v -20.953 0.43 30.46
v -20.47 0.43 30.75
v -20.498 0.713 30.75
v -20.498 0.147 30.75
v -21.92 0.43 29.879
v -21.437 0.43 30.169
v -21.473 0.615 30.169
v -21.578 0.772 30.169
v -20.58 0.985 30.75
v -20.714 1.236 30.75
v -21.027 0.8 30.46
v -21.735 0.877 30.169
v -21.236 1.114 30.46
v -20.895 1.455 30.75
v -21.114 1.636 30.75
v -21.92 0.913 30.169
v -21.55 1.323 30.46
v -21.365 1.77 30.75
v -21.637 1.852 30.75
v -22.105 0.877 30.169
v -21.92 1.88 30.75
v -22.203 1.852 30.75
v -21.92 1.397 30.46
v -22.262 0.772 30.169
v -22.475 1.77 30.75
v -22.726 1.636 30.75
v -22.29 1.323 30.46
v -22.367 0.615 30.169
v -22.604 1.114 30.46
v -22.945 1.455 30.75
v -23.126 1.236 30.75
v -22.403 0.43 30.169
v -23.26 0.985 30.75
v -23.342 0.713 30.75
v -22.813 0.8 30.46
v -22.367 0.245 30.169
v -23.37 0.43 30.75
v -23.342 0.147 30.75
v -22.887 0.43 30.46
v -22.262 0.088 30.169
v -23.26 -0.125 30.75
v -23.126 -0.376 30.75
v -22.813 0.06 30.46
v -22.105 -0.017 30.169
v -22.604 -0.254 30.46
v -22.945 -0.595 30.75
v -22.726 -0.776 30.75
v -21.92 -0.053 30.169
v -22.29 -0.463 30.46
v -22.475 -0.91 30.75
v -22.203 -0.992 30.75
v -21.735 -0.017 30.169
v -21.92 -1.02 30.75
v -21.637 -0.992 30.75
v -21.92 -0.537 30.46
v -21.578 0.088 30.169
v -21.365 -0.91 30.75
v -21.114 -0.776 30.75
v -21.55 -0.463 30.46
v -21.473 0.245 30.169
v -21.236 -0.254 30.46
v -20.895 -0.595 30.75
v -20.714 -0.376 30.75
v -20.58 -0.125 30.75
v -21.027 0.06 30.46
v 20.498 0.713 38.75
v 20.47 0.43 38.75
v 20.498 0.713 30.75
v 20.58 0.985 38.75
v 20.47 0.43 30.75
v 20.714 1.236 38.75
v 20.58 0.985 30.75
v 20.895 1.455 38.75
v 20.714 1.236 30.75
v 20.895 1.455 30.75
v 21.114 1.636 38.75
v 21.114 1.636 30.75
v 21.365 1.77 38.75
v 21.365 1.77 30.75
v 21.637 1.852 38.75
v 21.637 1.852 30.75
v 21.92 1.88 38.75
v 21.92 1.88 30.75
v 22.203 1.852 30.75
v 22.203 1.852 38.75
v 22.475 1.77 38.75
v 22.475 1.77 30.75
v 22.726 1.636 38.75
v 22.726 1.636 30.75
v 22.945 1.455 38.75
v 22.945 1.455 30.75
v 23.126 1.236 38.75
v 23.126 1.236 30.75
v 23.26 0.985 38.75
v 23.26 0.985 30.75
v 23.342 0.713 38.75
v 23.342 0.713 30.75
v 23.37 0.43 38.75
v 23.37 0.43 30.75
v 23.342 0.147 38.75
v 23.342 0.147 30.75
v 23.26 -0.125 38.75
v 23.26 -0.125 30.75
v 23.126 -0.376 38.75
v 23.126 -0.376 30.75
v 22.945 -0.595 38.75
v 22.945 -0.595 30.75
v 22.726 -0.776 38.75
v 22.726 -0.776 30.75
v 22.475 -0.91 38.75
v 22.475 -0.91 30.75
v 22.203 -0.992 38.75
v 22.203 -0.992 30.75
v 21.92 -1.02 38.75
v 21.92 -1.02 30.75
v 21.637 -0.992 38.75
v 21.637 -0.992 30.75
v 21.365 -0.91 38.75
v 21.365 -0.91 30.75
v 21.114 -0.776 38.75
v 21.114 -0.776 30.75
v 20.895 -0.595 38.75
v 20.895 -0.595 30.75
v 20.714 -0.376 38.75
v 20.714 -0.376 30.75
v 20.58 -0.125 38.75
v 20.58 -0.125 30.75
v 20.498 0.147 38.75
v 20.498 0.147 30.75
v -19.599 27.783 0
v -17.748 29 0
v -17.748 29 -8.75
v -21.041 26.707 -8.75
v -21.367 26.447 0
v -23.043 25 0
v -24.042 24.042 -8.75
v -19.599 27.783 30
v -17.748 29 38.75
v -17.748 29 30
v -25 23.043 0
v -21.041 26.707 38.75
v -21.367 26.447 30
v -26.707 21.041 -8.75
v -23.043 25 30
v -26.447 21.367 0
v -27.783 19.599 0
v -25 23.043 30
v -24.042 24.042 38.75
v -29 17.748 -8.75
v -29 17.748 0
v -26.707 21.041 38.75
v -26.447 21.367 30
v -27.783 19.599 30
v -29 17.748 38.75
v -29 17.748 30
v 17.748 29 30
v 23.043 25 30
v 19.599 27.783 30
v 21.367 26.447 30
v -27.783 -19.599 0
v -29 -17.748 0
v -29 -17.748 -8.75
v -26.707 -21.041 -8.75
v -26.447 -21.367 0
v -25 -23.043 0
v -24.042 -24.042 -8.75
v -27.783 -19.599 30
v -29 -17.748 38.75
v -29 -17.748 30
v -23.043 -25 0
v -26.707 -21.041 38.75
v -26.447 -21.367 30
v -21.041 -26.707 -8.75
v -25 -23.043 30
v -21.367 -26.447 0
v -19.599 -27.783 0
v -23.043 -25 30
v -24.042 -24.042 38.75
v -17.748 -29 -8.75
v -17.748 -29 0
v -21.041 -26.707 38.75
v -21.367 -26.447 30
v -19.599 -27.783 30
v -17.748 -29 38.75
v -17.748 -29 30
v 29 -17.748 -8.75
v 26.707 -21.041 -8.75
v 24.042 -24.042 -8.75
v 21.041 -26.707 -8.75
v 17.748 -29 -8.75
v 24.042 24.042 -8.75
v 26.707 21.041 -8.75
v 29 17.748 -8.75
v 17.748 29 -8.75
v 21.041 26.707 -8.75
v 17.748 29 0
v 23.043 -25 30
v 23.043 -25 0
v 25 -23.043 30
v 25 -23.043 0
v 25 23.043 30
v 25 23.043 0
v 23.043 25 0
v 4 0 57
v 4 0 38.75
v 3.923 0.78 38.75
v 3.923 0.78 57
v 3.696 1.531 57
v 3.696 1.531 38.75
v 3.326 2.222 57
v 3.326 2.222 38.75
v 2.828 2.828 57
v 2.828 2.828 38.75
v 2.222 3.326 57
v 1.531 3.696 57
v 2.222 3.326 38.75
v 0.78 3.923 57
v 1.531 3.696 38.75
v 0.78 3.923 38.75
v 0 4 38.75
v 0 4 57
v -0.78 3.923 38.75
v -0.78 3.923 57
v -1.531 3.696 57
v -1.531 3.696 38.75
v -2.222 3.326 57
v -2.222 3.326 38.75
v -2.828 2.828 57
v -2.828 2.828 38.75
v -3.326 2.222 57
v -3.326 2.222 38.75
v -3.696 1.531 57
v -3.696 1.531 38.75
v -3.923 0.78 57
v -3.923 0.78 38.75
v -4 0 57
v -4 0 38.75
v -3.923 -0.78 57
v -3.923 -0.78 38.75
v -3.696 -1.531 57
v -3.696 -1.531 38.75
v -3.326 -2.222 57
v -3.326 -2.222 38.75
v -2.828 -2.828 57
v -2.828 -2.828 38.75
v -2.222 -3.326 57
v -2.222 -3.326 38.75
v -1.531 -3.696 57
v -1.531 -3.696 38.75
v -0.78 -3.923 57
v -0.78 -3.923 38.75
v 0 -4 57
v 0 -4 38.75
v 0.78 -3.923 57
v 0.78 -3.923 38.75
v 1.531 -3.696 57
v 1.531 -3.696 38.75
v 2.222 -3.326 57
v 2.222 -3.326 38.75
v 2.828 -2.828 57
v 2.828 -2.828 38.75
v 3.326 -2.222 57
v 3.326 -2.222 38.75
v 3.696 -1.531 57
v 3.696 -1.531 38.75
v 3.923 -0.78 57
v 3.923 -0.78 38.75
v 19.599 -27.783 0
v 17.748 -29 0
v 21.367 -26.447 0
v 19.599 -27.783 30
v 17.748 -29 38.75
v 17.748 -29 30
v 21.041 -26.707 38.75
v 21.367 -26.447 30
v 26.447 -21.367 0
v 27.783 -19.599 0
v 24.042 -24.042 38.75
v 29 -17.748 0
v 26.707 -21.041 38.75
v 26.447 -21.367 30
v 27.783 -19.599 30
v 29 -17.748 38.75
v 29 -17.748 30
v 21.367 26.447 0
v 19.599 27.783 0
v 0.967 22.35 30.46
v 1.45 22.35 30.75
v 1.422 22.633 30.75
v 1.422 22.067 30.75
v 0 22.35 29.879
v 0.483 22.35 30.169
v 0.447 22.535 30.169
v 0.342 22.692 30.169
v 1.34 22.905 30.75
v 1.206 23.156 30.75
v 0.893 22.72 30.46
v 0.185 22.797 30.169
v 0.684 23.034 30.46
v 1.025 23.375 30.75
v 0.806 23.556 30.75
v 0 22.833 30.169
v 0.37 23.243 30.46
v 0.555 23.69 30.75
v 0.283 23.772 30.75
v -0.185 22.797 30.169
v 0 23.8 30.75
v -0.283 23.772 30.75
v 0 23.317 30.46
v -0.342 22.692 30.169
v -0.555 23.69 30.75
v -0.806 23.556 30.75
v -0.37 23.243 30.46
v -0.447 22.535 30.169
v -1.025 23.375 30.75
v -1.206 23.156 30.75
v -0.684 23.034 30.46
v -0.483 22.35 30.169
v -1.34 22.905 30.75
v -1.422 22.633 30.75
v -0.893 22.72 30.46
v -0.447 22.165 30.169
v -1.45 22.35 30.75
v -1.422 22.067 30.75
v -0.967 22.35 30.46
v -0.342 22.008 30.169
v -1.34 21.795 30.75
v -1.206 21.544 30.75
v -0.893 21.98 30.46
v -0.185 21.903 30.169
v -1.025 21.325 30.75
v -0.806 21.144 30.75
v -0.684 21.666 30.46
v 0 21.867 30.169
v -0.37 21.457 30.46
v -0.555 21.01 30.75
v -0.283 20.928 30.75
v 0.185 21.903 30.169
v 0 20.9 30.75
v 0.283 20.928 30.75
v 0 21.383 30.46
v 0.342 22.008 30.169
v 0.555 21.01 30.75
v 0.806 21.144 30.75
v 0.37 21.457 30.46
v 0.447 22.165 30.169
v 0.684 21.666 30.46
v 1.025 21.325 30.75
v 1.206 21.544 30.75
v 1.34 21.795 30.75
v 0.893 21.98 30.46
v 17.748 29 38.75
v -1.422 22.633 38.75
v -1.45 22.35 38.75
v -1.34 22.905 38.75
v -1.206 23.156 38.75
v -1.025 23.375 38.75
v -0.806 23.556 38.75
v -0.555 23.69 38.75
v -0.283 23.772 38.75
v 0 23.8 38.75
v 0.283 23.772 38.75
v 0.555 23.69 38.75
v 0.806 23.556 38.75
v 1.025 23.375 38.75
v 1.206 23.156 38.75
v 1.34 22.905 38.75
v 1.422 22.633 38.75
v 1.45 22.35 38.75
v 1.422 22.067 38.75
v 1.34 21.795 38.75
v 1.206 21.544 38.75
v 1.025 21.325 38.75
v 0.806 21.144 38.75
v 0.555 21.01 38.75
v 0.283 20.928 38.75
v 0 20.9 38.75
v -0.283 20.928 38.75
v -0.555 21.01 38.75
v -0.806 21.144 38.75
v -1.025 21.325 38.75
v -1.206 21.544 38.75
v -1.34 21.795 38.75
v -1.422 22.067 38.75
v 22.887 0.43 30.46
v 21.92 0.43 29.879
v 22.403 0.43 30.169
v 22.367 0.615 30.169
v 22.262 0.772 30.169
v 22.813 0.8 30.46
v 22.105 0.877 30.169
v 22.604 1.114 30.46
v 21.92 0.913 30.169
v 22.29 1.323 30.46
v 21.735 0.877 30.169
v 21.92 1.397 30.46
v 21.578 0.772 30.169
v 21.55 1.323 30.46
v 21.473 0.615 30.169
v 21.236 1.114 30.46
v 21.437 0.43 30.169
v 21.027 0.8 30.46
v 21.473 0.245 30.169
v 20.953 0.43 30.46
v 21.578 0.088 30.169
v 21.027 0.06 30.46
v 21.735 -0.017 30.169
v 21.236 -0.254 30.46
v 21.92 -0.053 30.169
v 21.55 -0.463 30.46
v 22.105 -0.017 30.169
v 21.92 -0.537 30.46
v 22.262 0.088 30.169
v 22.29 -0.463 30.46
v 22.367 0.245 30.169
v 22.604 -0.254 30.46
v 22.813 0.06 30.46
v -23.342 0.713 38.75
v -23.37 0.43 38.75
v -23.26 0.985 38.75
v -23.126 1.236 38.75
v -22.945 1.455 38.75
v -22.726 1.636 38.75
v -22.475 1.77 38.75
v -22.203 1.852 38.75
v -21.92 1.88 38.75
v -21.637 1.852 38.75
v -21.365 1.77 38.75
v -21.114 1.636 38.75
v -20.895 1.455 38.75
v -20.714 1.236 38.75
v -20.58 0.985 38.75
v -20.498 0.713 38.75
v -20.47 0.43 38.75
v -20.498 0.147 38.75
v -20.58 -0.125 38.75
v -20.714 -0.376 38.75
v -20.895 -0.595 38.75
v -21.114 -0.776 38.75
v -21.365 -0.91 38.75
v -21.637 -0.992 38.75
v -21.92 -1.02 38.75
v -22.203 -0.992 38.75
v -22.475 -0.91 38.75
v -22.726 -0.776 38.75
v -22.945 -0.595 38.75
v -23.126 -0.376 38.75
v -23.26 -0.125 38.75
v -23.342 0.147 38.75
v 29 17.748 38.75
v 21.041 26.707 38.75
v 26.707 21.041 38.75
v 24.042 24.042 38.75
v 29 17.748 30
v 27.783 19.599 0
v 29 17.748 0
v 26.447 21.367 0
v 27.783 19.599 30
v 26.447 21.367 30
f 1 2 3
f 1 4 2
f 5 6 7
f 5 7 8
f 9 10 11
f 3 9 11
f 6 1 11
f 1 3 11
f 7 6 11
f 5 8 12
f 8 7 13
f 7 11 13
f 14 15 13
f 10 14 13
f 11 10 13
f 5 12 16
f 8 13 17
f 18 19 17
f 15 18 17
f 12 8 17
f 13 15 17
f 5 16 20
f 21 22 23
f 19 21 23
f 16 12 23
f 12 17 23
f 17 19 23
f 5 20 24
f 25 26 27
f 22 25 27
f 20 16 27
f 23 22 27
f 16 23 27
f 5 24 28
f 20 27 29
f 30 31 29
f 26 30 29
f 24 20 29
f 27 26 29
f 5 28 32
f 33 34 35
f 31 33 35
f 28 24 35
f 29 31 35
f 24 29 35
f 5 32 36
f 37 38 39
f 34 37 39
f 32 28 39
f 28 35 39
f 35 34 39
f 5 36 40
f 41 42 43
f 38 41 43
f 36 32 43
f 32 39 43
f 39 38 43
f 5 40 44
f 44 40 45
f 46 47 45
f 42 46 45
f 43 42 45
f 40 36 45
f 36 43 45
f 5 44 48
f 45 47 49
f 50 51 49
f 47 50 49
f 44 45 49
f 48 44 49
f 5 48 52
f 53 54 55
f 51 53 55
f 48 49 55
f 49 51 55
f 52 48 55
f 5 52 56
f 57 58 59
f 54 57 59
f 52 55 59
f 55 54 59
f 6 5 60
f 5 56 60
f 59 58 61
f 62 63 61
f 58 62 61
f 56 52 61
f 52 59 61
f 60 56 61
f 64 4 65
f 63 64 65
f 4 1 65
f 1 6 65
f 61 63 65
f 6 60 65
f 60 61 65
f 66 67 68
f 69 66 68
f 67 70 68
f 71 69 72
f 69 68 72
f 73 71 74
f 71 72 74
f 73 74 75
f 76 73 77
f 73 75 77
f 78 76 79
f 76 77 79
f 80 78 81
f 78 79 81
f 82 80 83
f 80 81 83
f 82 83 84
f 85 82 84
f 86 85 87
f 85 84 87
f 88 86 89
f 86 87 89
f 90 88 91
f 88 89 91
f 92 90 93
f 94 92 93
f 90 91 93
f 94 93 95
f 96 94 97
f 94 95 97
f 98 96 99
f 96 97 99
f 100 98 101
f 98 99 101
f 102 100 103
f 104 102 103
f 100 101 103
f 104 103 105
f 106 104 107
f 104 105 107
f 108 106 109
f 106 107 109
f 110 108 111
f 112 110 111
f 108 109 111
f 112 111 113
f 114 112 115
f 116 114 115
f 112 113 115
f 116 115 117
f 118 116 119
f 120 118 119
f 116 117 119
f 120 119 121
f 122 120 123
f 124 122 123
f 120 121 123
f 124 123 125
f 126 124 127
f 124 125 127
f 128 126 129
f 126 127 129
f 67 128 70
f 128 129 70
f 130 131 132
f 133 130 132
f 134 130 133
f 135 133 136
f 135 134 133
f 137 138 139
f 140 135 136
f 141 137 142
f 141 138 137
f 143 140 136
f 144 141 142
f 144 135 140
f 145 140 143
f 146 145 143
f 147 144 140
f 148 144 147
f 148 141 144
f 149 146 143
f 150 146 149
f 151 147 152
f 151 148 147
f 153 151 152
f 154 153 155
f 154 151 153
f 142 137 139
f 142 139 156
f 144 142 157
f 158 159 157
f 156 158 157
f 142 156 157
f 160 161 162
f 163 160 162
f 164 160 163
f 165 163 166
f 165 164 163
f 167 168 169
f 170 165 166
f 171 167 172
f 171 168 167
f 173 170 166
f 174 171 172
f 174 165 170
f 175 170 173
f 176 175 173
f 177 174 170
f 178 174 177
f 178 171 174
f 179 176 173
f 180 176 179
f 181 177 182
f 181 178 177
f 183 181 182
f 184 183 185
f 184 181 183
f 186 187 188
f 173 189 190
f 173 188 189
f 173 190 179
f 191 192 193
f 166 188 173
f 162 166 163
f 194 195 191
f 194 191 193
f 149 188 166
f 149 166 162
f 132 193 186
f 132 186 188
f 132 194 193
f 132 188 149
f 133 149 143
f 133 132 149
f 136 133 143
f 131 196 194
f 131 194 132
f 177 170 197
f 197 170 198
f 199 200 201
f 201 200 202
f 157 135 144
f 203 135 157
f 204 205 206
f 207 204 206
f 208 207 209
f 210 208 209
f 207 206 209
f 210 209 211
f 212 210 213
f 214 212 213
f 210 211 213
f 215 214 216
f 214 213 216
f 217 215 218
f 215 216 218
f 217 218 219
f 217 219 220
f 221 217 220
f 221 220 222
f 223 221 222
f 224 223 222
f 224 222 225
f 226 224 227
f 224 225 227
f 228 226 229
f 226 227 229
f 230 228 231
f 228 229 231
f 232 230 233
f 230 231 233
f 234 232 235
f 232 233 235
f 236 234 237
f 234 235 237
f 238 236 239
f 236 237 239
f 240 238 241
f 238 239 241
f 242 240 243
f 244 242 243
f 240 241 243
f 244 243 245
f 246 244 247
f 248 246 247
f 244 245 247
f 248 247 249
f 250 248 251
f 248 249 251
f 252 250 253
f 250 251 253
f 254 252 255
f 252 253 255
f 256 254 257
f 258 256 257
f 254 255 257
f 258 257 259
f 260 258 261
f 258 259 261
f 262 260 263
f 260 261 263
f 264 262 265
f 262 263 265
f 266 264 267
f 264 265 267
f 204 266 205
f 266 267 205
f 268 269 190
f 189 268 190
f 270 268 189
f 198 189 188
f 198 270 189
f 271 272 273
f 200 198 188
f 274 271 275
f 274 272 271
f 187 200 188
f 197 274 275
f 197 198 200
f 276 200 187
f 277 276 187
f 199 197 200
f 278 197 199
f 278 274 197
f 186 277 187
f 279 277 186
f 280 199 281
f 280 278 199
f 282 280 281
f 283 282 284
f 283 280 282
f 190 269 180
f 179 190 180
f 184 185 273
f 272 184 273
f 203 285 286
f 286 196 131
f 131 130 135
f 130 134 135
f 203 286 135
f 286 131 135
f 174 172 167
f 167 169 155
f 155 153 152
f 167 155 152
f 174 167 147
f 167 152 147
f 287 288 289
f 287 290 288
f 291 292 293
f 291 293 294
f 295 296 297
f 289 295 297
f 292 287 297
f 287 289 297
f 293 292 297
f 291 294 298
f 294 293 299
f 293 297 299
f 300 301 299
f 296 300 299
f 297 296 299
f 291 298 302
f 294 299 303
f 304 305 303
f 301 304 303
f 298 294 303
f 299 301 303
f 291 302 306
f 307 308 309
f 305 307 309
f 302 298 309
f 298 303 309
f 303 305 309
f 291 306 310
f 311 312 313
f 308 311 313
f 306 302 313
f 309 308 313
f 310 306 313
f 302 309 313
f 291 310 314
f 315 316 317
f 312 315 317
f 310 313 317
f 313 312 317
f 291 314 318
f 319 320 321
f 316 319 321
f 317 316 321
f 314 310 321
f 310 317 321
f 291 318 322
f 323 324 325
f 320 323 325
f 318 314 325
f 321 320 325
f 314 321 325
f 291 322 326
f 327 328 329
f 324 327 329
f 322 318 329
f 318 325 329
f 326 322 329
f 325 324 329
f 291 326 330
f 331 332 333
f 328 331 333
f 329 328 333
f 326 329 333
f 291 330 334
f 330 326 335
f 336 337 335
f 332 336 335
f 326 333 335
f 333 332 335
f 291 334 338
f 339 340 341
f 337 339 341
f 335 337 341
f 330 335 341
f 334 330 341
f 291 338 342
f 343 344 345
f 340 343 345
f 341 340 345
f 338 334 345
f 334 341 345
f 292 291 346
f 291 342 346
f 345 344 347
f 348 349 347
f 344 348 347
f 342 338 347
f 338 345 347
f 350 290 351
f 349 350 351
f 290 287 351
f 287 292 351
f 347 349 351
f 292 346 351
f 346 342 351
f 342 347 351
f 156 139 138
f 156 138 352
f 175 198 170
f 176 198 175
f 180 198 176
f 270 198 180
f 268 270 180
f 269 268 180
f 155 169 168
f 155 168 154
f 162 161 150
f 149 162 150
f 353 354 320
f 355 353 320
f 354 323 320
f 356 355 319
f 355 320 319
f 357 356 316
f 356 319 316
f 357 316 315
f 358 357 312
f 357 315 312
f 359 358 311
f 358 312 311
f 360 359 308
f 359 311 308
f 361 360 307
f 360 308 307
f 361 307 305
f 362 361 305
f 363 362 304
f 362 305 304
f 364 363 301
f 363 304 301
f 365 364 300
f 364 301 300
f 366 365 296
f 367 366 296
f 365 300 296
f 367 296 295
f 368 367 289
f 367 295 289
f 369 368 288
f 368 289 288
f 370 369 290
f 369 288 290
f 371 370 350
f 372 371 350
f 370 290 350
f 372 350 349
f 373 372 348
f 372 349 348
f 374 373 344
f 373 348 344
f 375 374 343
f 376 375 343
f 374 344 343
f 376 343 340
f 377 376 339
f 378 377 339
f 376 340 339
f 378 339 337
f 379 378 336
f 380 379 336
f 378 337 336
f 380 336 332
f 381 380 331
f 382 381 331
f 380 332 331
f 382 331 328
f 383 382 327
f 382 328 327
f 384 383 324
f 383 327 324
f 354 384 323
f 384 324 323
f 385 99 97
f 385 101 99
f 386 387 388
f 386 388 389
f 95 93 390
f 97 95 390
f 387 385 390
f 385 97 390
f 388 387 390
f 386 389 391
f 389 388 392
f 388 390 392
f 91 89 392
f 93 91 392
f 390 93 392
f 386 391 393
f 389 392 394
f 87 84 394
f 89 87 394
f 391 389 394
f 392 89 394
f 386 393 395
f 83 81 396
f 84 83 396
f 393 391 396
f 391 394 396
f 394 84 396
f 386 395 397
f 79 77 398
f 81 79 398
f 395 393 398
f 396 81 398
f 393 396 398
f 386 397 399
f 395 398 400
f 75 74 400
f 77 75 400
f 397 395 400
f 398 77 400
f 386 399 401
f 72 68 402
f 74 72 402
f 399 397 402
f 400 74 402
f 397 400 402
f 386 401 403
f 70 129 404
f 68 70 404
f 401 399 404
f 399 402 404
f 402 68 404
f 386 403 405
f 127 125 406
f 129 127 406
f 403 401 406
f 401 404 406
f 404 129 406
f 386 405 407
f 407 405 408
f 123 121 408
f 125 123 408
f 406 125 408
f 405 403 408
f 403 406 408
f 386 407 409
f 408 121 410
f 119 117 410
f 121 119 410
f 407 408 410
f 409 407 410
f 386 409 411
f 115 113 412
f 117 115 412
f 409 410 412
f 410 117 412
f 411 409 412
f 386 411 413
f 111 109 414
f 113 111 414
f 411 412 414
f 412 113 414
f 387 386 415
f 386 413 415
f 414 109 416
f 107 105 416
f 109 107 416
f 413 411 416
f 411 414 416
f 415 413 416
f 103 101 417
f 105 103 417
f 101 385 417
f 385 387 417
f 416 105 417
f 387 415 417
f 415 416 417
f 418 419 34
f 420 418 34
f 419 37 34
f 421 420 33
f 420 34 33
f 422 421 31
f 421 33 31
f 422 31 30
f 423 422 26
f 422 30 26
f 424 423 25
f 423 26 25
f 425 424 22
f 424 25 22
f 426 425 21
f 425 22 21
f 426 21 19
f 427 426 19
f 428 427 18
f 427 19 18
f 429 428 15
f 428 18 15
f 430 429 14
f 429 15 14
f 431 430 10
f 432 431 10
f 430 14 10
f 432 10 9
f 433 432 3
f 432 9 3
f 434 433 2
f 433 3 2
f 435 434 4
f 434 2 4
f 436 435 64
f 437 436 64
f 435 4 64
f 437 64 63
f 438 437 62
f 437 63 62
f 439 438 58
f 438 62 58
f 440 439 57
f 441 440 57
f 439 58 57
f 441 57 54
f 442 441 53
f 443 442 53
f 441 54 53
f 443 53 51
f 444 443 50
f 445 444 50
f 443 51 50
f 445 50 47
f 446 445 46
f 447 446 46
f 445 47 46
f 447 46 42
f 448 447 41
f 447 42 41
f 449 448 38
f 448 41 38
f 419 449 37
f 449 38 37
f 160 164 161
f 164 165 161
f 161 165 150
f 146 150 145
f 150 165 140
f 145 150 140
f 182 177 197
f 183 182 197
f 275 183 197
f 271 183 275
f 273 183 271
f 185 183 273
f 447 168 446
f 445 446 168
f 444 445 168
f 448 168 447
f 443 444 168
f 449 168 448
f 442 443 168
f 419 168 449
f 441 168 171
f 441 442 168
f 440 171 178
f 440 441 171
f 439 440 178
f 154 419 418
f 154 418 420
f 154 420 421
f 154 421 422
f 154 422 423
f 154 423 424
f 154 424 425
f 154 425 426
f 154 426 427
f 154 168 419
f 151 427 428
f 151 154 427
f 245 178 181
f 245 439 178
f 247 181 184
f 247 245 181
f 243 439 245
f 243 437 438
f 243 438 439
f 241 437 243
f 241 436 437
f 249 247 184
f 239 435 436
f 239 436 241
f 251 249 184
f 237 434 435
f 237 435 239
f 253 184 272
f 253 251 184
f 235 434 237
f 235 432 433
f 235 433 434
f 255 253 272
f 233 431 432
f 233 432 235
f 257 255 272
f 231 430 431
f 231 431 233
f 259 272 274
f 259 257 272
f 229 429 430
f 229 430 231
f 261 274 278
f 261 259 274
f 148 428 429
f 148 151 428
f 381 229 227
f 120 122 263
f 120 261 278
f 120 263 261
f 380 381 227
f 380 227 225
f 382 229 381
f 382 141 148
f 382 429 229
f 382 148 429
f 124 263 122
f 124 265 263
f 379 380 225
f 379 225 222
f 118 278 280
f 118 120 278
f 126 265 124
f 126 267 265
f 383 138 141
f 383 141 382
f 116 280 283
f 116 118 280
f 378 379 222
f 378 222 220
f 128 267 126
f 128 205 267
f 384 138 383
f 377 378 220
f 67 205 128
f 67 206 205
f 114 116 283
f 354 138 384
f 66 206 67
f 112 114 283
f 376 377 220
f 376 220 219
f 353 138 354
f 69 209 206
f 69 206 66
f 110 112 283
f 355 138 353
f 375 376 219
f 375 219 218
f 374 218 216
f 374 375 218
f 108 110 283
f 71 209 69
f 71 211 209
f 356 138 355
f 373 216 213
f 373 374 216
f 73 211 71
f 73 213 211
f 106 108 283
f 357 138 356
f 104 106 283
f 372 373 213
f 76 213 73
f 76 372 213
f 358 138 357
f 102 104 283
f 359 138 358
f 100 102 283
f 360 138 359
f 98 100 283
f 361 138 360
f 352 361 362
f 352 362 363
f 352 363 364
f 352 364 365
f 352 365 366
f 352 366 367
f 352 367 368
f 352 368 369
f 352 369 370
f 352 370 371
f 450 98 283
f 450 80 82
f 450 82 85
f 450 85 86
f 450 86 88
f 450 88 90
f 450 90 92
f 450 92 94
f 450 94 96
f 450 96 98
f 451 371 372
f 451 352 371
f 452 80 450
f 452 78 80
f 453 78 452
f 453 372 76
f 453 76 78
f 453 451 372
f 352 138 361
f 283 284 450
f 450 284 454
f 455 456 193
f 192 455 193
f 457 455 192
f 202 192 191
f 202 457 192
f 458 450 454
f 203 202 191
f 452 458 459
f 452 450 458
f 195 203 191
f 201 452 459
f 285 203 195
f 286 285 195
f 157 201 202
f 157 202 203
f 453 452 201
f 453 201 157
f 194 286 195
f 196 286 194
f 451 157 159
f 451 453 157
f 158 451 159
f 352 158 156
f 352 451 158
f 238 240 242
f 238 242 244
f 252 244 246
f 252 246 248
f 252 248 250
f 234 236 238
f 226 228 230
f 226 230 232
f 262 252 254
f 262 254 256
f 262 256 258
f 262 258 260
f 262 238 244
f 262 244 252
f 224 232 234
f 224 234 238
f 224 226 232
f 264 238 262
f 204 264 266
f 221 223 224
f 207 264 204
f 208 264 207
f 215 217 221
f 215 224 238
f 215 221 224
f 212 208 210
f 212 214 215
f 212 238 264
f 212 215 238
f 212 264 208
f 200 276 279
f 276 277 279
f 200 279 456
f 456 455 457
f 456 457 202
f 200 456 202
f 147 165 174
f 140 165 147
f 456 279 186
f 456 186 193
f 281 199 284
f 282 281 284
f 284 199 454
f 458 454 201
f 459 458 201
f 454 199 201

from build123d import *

# Parameters (mm, degrees)
SKETCH_1_W               = 50
SKETCH_1_H               = 50
EXTRUDE_1_DEPTH          = 30
SKETCH_2_W               = 58
SKETCH_2_H               = 58
EXTRUDE_2_DEPTH          = 8.75
SKETCH_3_W               = 58
SKETCH_3_H               = 58
EXTRUDE_3_DEPTH          = 8.75
SKETCH_6_R               = 4
EXTRUDE_4_DEPTH          = 18.25
SKETCH_4_OUTSIDE_W       = 81.024
SKETCH_4_OUTSIDE_H       = 81.024
SKETCH_4_OUTSIDE_R       = 34
CUT_EXTRUDE_2_DEPTH      = 63.755477849
HOLE_WIZARD_M3_5_1_D     = 2.9
HOLE_WIZARD_M3_5_1_DEPTH = 8
HOLE_WIZARD_M3_5_1_TIP   = 0.871247898


with BuildPart() as part:
    # 草图1 → 凸台-拉伸1 (new body)
    with BuildSketch(Plane.XY):
        Rectangle(SKETCH_1_W, SKETCH_1_H)
    extrude(amount=EXTRUDE_1_DEPTH)

    # 草图2 → 凸台-拉伸2 (add)
    with BuildSketch(Plane.XY.offset(30)):
        Rectangle(SKETCH_2_W, SKETCH_2_H)
    extrude(amount=EXTRUDE_2_DEPTH)

    # 草图3 → 凸台-拉伸3 (add)
    with BuildSketch(Plane(origin=(0, 0, 0), x_dir=(-1, 0, 0), z_dir=(0, 0, -1))):
        Rectangle(SKETCH_3_W, SKETCH_3_H)
    extrude(amount=EXTRUDE_3_DEPTH)

    # 草图6 → 凸台-拉伸4 (add)
    with BuildSketch(Plane.XY.offset(38.75)):
        Circle(SKETCH_6_R)
    extrude(amount=EXTRUDE_4_DEPTH)

    # 草图4 outside → 切除-拉伸2 (cut, through all)
    with BuildSketch(Plane.XY.offset(38.75)):
        Rectangle(SKETCH_4_OUTSIDE_W, SKETCH_4_OUTSIDE_H)
        Circle(SKETCH_4_OUTSIDE_R, mode=Mode.SUBTRACT)
    extrude(amount=-CUT_EXTRUDE_2_DEPTH, mode=Mode.SUBTRACT)

    # M3.5 螺纹孔1
    with Locations(Plane.XY.offset(38.75)):
        with Locations((0, 22.35), (-21.92, 0.43), (21.92, 0.43)):
            Hole(HOLE_WIZARD_M3_5_1_D / 2, depth=HOLE_WIZARD_M3_5_1_DEPTH)
            with Locations((0, 0, -(HOLE_WIZARD_M3_5_1_DEPTH + HOLE_WIZARD_M3_5_1_TIP / 2))):  # 118° drill point
                Cone(0, HOLE_WIZARD_M3_5_1_D / 2, HOLE_WIZARD_M3_5_1_TIP, mode=Mode.SUBTRACT)


solid = part.part
